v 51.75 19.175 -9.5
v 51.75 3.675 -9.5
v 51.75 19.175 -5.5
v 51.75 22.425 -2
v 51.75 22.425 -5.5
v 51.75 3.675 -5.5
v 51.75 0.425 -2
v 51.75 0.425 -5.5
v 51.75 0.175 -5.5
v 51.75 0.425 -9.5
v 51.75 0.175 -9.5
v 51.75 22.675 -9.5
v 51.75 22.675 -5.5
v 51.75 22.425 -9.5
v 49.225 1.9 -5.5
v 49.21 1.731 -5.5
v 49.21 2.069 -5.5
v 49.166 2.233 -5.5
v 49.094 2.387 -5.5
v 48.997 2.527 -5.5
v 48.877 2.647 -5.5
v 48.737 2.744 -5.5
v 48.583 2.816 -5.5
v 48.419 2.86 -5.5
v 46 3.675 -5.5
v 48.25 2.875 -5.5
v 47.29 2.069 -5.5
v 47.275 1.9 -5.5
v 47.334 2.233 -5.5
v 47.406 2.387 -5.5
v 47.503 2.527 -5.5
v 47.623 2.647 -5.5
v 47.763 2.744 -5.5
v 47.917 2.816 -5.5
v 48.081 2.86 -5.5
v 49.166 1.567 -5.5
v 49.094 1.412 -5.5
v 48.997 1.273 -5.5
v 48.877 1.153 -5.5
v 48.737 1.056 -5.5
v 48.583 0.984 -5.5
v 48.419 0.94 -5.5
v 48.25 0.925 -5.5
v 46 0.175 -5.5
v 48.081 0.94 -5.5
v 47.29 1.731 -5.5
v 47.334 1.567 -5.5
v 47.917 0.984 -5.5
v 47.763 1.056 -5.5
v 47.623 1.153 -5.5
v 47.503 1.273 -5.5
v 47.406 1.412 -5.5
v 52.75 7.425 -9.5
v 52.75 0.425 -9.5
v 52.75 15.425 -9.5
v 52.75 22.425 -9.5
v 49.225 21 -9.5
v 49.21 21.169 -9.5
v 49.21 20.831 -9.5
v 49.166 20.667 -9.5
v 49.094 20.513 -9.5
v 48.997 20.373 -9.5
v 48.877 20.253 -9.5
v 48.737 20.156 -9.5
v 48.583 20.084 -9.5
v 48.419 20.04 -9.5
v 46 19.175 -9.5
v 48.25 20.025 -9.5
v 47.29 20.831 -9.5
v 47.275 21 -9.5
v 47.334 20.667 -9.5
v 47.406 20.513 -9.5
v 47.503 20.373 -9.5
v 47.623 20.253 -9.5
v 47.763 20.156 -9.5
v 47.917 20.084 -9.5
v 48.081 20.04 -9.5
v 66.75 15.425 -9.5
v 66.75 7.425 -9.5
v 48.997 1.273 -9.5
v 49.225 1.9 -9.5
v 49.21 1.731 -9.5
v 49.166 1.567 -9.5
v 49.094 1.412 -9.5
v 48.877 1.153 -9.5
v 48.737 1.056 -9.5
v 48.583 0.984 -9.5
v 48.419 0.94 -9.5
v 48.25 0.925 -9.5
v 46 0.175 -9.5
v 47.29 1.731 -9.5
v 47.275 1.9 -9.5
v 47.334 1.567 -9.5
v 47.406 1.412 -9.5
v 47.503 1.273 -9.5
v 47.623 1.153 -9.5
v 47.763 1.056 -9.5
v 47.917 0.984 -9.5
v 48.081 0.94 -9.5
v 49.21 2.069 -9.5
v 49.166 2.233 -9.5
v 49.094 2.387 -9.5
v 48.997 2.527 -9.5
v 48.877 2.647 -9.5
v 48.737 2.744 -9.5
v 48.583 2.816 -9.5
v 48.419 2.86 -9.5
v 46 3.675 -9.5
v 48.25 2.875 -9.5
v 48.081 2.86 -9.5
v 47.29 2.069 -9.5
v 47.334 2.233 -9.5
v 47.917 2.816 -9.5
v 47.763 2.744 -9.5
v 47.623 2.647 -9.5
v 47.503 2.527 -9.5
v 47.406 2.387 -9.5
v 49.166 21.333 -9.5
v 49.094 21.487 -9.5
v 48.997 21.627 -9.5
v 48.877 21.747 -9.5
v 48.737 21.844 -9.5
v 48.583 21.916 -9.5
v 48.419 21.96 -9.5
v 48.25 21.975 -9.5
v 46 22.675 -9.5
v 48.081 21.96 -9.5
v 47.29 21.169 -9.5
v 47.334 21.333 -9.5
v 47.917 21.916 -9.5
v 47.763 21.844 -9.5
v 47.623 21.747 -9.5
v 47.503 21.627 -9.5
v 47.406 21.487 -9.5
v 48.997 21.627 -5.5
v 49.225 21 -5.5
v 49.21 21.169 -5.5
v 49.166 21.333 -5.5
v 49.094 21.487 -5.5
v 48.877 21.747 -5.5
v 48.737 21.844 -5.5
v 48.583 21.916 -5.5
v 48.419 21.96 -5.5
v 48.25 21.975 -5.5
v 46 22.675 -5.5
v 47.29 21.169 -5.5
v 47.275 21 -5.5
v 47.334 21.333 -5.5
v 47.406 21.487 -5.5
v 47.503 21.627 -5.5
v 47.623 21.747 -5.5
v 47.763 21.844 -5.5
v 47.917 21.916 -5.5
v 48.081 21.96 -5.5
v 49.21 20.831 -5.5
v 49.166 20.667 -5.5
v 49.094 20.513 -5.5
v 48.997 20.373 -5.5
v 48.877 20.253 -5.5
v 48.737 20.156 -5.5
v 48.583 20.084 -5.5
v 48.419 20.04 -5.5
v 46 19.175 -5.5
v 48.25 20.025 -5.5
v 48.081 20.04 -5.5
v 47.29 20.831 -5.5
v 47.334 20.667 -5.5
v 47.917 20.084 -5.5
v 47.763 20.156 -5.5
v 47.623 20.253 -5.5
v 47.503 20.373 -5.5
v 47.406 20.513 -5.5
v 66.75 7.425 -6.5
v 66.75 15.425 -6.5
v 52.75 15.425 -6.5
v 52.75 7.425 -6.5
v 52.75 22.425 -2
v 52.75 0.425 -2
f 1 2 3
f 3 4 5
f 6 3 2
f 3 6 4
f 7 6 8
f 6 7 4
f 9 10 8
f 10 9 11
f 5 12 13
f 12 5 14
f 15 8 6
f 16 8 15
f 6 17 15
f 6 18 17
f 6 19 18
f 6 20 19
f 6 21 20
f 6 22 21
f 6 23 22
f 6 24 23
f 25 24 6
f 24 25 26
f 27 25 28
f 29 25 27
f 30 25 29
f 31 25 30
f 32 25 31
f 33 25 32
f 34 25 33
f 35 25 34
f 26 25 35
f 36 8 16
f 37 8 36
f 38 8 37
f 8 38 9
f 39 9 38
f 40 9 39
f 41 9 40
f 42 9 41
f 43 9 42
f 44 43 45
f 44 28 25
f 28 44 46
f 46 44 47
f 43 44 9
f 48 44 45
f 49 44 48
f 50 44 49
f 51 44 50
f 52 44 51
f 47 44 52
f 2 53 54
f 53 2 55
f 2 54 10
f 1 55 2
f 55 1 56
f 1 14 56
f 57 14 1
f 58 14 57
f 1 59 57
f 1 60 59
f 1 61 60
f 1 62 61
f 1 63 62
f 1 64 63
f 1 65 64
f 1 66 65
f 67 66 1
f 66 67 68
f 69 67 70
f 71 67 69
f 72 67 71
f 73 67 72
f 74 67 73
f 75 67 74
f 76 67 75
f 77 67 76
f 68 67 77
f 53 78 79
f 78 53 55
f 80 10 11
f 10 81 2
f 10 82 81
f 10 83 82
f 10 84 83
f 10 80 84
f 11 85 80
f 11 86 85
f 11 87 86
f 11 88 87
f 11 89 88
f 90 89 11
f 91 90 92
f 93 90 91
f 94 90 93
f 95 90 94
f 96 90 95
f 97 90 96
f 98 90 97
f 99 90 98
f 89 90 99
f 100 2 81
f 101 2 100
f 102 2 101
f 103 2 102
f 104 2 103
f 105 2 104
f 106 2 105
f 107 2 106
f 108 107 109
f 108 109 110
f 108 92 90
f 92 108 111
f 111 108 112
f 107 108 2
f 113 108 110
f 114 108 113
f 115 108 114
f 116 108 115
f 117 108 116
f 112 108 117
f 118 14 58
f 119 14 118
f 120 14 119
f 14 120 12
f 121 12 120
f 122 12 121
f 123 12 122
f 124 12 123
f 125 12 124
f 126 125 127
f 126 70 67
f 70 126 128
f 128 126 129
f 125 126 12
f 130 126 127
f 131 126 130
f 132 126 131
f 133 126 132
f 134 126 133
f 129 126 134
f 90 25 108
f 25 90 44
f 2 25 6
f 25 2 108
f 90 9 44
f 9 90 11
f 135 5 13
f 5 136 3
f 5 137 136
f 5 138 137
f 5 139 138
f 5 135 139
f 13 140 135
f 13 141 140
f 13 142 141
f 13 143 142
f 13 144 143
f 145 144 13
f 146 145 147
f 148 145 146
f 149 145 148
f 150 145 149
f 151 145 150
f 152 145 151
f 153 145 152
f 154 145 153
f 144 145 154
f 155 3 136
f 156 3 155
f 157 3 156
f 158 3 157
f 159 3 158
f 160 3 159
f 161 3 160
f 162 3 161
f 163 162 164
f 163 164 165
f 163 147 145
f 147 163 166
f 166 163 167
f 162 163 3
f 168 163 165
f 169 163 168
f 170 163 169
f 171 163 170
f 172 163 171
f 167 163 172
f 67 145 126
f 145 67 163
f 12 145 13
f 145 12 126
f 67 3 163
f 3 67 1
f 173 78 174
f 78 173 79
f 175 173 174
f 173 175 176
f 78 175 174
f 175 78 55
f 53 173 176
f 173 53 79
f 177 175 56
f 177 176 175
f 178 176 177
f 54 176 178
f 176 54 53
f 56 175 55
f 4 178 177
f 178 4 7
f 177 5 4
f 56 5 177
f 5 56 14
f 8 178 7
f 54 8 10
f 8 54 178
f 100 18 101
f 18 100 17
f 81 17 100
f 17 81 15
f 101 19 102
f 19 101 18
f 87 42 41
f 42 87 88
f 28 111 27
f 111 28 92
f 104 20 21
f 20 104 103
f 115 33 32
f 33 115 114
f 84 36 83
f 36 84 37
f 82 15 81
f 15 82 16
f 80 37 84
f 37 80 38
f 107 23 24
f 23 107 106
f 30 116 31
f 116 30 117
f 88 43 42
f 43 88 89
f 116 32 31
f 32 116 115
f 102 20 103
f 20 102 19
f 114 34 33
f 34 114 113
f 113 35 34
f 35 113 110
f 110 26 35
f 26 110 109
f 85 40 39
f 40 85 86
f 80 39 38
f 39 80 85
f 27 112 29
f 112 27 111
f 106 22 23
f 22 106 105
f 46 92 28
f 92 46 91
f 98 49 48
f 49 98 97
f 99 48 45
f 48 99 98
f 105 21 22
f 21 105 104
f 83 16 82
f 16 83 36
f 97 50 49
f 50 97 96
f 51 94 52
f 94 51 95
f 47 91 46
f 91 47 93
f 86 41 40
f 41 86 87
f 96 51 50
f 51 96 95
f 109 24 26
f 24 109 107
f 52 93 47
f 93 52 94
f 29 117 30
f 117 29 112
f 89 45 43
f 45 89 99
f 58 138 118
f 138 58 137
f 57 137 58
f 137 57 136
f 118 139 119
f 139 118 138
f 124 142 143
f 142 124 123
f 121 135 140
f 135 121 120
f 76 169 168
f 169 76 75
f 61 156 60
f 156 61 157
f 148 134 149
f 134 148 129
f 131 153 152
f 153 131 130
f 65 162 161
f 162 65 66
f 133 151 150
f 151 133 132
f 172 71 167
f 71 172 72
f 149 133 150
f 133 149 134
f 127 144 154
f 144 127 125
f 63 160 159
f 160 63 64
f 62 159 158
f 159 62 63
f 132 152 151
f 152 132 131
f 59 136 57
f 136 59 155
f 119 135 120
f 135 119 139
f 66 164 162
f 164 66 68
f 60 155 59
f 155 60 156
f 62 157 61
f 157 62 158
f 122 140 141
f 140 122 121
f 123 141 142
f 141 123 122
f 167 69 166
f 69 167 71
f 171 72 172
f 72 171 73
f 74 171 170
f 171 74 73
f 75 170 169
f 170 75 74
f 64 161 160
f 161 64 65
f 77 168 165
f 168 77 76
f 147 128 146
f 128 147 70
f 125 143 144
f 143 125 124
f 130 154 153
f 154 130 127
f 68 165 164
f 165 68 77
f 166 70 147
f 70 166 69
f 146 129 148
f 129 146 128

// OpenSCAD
$fn = 36;

feather_standoffs = [
	[2.5, 2.55, 2.45],
	[2.5, 20.32, 2.45],
	[48.25, 1.9, 1.95],
	[48.25, 21, 1.95]
];

rtc_standoffs = [
	[59.25, 2.5, 2.45],
	[59.25, 20.3, 2.45]
];

module feather() {
	translate([0, 22.85, -4])
	rotate([180, 0, 0])
	import("5691 ESP32 S3 Reverse TFT Feather.stl");
}

module nav_switch() {
	translate([58, 22.85 / 2, -3])
	rotate([0, 0, 90])
	union() {
		// base
		translate([-5, -5, -3.15])
		cube([10, 10, 3.15]);
		
		// joystick base
		cylinder(d = 6.5, h = 5.8 - 3.15);
		
		// joystick top
		translate([-3.2 / 2, -3.2 / 2, 5.8 - 3.15])
		cube([3.2, 3.2, 10 - 5.8]);
		
		// pins
		for (y = [-6.5 / 2, -0.45, 6.5 / 2]) {
			for (x = [-10 / 2, 10 / 2]) {
				translate([x, y, -3.5 - 3.15])
				cylinder(d = 0.9, h = 3.5);
			}
		}
	}
}

module battery() {
	translate([4, 22.85 / 2 - 17 / 2, -19])
	cube([36, 17, 7.8]);
}

module rtc() {
	translate([44, 22.85, -15.5])
	rotate([0, 0, -90])
	import("3013 DS3231 RTC.stl");
}

module piezo() {
	translate([53, 22.85 + 5.5, -9])
	rotate([90, 0, 0])
	cylinder(d = 13, h = 3, $fn = 36);
}

module components() {
	color("#ff99ff") piezo();
	color("#ffaaaa") rtc();
	color("#ffff99") feather();
	color("#88ff88") nav_switch();
	color("blue") battery();
}

module enclosure() {
	render()
	difference() {
		hull() {
			for (x = [0, 65]) {
				for (y = [-4, 22.85 + 4]) {
					translate([x, y, -19])
					cylinder(d = 5, h = 19, $fn = 36);
				}
			}
		}
		
		hull() {
			for (x = [2, 63]) {
				for (y = [-2, 22.85 + 2]) {
					translate([x, y, -19])
					cylinder(d = 5, h = 17, $fn = 36);
				}
			}
		}
		
		translate([44.45, 22.85 / 2, -10])
		cylinder(d = 1.5, h = 30, $fn = 20);
		
		translate([58, 22.85 / 2, -2])
		cylinder(d1 = 7.5, d2 = 11.5, h = 2, $fn = 36);
	
		hull() {
			translate([12.3, 4, -2])
			cube([25.2, 15.2, 0.01]);
			
			translate([10.3, 2, 0])
			cube([29.2, 19.2, 0.01]);
		}
		
		for (location = feather_standoffs) {
			x = location[0];
			y = location[1];
			inner_diameter = location[2];
			
			translate([x, y, -2])
			cylinder(d = inner_diameter, h = 1.5, $fn = 36);
		}
		
		nav_switch_retainer(0.5);
	
		translate([53 - 13.2 / 2, 22.85 + 5.5 - 3.2, -19])
		cube([13.2, 3.2, 17]);
		
		USB_C_WIDTH = 9.7;
		USB_C_DEPTH = 4;

		translate([-3, 22.85 / 2, -7.2])
		rotate([90, 0, 90])
		union() {
			for (x = [-1, 1]) {
				translate([(USB_C_WIDTH / 2 - USB_C_DEPTH / 2) * x, 0, 0])
				cylinder(d = USB_C_DEPTH, h = 5, $fn = 20);
			}
			
			translate([0, 0, 5 / 2])
			cube([USB_C_WIDTH - USB_C_DEPTH, USB_C_DEPTH, 5], center = true);
		}
	
		translate([-5, 22.85 / 2 + 9.5, -7.2])
		rotate([90, 0, 60])
		cylinder(d = 1.9, h = 15, $fn = 20);
	}
	
	difference() {
		union() {
			inset = 1;
			for (x = [-2.5 + inset, 65 + 2.5 - inset - 5]) {
				for (y = [-6.5 + inset, 22.85 + 4 + 2.5 - inset - 5]) {
					translate([x, y, -19])
					cube([5, 5, 19]);
				}
			}
		}
		
		screws();
	}
	
	render()
	difference() {
		translate([53 - 15.2 / 2, 22.85 + 5.5 - 4.2, -14])
		cube([15.2, 4.2, 12]);
		
		translate([53 - 13.2 / 2, 22.85 + 5.5 - 3.2, -14])
		cube([13.2, 3.2, 12]);
	}
	
	rtc_standoff_height = 12;
	for (location = rtc_standoffs) {
		x = location[0];
		y = location[1];
		inner_diameter = location[2];
		
		translate([x, y, -rtc_standoff_height - 2])
		render()
		difference() {
			cylinder(d = inner_diameter + 2.5, h = rtc_standoff_height, $fn = 36);
			cylinder(d = inner_diameter, h = rtc_standoff_height, $fn = 36);
		}
	}
	
	feather_standoff_height = 2;
	for (location = feather_standoffs) {
		x = location[0];
		y = location[1];
		inner_diameter = location[2];
		
		translate([x, y, -feather_standoff_height - 2])
		render()
		difference() {
			cylinder(d = inner_diameter + 2.5, h = feather_standoff_height, $fn = 36);
			cylinder(d = inner_diameter, h = feather_standoff_height, $fn = 36);
		}
	}
}

module nav_switch_retainer(extra_height = 0) {
	difference() {
		union() {
			translate([51.75, 22.85 / 2 - 8 / 2, -9.5 - extra_height])
			cube([15, 8, 3 + extra_height]);
			
			translate([51.75, 22.85 / 2 - 22 / 2, -9.5])
			cube([1, 22, 7.5]);
			
			for (y = [22.85 / 2 - 11.25, 22.85 / 2 + 11 - 3.25]) {
				translate([46, y, -9.5])
				cube([51.75 - 46, 3.5, 4]);
			}
		}
	
		for (location = feather_standoffs) {
			x = location[0];
			y = location[1];
			inner_diameter = location[2];
			
			translate([x, y, -20])
			cylinder(d = inner_diameter, h = 20, $fn = 36);
		}
	}
}

module screws() {
	inset = 4;
	for (x = [-2.5 + inset, 65 + 2.5 - inset]) {
		for (y = [-6.5 + inset, 22.85 + 4 + 2.5 - inset]) {
			translate([x, y, -19 - 2])
			screw();
		}
	}
}

module screw() {
	SCREW_HEIGHT = 15;
	SCREW_HEAD_DIAMETER = 4.1;
	SCREW_HEAD_HEIGHT = 1.7;
	SCREW_SHAFT_DIAMETER = 2;

	cylinder(d = SCREW_SHAFT_DIAMETER, h = SCREW_HEIGHT, $fn = 20);
	
	translate([0, 0, 0])
	cylinder(d1 = SCREW_HEAD_DIAMETER, d2 = SCREW_SHAFT_DIAMETER, h = SCREW_HEAD_HEIGHT, $fn = 20);
}

module backplate() {
	render()
	difference() {
		hull() {
			for (x = [0, 65]) {
				for (y = [-4, 22.85 + 4]) {
					translate([x, y, -21])
					cylinder(d = 5, h = 2, $fn = 36);
				}
			}
		}
		
		screws();
	}
	
	render()
	difference() {
		translate([2, 22.85 / 2 - 17 / 2 - 2, -19])
		cube([40, 21, 7.8]);
		
		battery();
	
		translate([2, 22.85 / 2 - 17 / 2 - 2, -19])
		cube([6, 6, 7.8]);
	}
}

nav_switch_retainer();
//enclosure();
//backplate();
//components();
